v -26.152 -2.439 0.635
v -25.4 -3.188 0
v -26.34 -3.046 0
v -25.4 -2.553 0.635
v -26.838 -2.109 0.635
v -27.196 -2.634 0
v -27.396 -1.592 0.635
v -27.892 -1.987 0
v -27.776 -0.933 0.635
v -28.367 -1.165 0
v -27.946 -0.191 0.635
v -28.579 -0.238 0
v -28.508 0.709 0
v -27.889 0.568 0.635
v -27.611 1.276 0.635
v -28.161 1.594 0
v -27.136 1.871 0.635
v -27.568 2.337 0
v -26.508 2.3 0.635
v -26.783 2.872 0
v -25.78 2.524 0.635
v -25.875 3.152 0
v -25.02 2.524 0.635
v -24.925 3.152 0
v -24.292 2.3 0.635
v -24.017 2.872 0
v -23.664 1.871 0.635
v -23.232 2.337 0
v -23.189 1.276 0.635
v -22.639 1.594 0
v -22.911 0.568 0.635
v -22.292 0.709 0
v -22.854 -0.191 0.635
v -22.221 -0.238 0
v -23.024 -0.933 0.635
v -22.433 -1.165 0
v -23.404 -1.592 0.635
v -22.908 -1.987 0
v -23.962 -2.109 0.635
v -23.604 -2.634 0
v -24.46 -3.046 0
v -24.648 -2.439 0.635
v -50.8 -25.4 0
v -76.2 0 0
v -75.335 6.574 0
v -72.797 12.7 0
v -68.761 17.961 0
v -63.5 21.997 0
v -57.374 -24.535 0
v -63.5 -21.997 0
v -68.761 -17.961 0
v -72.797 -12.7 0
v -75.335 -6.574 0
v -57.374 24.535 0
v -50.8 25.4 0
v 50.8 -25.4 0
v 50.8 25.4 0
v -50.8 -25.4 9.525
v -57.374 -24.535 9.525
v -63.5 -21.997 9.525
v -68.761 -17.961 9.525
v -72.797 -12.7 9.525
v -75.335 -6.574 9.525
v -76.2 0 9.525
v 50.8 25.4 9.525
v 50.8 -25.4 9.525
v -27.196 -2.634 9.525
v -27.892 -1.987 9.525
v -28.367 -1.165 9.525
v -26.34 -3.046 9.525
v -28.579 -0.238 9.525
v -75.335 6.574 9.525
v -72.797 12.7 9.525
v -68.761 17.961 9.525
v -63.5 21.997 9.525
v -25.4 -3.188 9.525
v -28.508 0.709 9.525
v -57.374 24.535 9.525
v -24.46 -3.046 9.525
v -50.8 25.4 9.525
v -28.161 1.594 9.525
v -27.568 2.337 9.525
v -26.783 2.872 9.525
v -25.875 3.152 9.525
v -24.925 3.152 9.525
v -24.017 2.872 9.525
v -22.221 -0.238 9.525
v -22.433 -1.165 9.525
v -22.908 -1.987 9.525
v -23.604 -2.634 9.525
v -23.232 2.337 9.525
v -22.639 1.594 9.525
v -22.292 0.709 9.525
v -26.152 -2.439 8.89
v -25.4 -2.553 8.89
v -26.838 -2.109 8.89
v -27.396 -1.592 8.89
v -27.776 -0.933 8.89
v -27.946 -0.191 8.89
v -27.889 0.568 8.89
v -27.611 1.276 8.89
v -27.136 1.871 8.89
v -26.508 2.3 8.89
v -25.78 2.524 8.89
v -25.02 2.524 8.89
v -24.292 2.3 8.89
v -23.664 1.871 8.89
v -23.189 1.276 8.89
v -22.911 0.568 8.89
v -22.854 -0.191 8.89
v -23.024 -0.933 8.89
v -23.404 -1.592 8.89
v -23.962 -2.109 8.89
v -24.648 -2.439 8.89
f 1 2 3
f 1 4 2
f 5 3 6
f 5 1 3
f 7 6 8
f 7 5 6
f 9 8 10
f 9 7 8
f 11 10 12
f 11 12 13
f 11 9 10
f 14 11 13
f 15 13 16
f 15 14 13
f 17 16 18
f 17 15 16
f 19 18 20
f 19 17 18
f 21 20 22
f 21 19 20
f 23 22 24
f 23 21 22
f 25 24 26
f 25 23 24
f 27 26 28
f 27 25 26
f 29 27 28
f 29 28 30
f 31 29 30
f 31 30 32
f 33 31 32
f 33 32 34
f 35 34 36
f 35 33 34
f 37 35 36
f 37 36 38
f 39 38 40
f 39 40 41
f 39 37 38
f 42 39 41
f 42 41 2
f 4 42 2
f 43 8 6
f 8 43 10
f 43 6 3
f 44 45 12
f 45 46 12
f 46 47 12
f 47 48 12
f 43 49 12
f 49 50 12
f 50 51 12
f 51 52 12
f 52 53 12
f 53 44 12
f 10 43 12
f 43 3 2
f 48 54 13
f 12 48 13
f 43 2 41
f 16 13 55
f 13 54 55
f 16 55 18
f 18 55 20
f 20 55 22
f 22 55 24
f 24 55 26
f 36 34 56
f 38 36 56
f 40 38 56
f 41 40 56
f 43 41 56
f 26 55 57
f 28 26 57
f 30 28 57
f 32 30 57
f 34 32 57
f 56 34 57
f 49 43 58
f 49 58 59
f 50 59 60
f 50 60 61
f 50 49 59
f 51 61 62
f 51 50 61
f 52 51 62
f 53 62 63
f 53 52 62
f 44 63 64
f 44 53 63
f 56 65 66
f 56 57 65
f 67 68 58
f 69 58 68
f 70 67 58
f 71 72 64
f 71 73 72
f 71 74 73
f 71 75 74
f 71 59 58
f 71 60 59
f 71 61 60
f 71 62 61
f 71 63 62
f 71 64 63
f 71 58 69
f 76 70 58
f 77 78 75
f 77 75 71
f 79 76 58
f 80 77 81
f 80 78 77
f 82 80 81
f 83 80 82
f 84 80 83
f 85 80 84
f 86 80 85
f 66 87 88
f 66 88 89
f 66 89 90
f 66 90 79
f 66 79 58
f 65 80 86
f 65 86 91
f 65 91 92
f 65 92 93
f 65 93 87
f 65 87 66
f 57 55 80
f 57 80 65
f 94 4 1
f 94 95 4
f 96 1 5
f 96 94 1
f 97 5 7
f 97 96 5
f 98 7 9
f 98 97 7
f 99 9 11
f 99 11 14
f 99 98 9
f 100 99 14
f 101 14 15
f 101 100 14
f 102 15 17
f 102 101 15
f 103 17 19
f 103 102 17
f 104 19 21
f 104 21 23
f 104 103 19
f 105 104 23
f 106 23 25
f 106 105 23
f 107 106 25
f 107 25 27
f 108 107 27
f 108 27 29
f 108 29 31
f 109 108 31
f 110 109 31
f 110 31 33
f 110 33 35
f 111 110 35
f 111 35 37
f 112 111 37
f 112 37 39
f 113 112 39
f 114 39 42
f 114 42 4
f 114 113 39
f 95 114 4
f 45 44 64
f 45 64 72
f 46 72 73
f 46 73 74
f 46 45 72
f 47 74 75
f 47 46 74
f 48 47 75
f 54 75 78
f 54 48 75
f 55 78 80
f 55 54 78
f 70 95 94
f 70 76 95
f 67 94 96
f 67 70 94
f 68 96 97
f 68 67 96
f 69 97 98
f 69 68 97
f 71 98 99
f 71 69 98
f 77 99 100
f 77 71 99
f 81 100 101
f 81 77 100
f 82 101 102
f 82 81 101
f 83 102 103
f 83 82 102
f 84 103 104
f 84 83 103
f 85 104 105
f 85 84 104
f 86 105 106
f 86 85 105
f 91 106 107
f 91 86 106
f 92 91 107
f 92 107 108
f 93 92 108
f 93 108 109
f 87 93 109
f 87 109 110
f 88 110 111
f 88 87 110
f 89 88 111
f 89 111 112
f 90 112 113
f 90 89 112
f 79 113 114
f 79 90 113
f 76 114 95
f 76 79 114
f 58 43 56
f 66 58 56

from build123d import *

# Parameters (mm, degrees)
SKETCH1_W               = 152.4
SKETCH1_H               = 50.8
BOSS_EXTRUDE2_DEPTH     = 9.525
CUT_EXTRUDE1_START      = -9.525
CUT_EXTRUDE1_DEPTH      = 9.525
CUT_EXTRUDE2_DEPTH      = 81.884643938
CUT_EXTRUDE2_DEPTH_BACK = 81.884643938


# Read off the part's stored shape, not the designer's step: Cut-Extrude1
with BuildPart() as part:
    # Sketch1 → Boss-Extrude2 (new body)
    with BuildSketch(Plane.XY):
        Rectangle(SKETCH1_W, SKETCH1_H)
    extrude(amount=BOSS_EXTRUDE2_DEPTH)

    # Sketch2 → 1/4-20 Tapped Hole1 (revolve, cut)
    with BuildSketch(Plane(origin=(-25.4, 0, 9.525), x_dir=(0, -1, 0), z_dir=(1, 0, 0))):
        Polygon((0, 0), (0, 9.525), (3.1877, 9.525), (2.5527, 8.89), (2.5527, 0.635), (3.1877, 0), align=None)
    revolve(axis=Axis((-25.4, 0, 15.875), (0, 0, -1)), mode=Mode.SUBTRACT)

    # Cut-Extrude1 outline → Cut-Extrude1 (cut)
    with BuildSketch(Plane.XY.offset(9.525).offset(CUT_EXTRUDE1_START)):
        with BuildLine():
            Line((-76.2, -25.4), (-50.8, -25.4))
            ThreePointArc((-50.8, -25.4), (-68.760512242, -17.960512242), (-76.2, 0))
            Line((-76.2, 0), (-76.2, -25.4))
        make_face()
        with BuildLine():
            Line((-76.2, 25.4), (-76.2, 0))
            ThreePointArc((-76.2, 0), (-68.760512242, 17.960512242), (-50.8, 25.4))
            Line((-50.8, 25.4), (-76.2, 25.4))
        make_face()
    extrude(amount=CUT_EXTRUDE1_DEPTH, mode=Mode.SUBTRACT)

    # Sketch5 → Cut-Extrude2 (cut, two sides: drawn at the far end of the back side and taken through both)
    with BuildSketch(Plane.XY.offset(9.525).offset(-CUT_EXTRUDE2_DEPTH_BACK)):
        Polygon((50.8, -359.042550973), (50.8, -51.798163577), (50.8, 47.427693525), (50.8, 354.672080921), (665.288774792, 354.672080921), (665.288774792, -359.042550973), align=None)
    extrude(amount=CUT_EXTRUDE2_DEPTH + CUT_EXTRUDE2_DEPTH_BACK, mode=Mode.SUBTRACT)


solid = part.part
